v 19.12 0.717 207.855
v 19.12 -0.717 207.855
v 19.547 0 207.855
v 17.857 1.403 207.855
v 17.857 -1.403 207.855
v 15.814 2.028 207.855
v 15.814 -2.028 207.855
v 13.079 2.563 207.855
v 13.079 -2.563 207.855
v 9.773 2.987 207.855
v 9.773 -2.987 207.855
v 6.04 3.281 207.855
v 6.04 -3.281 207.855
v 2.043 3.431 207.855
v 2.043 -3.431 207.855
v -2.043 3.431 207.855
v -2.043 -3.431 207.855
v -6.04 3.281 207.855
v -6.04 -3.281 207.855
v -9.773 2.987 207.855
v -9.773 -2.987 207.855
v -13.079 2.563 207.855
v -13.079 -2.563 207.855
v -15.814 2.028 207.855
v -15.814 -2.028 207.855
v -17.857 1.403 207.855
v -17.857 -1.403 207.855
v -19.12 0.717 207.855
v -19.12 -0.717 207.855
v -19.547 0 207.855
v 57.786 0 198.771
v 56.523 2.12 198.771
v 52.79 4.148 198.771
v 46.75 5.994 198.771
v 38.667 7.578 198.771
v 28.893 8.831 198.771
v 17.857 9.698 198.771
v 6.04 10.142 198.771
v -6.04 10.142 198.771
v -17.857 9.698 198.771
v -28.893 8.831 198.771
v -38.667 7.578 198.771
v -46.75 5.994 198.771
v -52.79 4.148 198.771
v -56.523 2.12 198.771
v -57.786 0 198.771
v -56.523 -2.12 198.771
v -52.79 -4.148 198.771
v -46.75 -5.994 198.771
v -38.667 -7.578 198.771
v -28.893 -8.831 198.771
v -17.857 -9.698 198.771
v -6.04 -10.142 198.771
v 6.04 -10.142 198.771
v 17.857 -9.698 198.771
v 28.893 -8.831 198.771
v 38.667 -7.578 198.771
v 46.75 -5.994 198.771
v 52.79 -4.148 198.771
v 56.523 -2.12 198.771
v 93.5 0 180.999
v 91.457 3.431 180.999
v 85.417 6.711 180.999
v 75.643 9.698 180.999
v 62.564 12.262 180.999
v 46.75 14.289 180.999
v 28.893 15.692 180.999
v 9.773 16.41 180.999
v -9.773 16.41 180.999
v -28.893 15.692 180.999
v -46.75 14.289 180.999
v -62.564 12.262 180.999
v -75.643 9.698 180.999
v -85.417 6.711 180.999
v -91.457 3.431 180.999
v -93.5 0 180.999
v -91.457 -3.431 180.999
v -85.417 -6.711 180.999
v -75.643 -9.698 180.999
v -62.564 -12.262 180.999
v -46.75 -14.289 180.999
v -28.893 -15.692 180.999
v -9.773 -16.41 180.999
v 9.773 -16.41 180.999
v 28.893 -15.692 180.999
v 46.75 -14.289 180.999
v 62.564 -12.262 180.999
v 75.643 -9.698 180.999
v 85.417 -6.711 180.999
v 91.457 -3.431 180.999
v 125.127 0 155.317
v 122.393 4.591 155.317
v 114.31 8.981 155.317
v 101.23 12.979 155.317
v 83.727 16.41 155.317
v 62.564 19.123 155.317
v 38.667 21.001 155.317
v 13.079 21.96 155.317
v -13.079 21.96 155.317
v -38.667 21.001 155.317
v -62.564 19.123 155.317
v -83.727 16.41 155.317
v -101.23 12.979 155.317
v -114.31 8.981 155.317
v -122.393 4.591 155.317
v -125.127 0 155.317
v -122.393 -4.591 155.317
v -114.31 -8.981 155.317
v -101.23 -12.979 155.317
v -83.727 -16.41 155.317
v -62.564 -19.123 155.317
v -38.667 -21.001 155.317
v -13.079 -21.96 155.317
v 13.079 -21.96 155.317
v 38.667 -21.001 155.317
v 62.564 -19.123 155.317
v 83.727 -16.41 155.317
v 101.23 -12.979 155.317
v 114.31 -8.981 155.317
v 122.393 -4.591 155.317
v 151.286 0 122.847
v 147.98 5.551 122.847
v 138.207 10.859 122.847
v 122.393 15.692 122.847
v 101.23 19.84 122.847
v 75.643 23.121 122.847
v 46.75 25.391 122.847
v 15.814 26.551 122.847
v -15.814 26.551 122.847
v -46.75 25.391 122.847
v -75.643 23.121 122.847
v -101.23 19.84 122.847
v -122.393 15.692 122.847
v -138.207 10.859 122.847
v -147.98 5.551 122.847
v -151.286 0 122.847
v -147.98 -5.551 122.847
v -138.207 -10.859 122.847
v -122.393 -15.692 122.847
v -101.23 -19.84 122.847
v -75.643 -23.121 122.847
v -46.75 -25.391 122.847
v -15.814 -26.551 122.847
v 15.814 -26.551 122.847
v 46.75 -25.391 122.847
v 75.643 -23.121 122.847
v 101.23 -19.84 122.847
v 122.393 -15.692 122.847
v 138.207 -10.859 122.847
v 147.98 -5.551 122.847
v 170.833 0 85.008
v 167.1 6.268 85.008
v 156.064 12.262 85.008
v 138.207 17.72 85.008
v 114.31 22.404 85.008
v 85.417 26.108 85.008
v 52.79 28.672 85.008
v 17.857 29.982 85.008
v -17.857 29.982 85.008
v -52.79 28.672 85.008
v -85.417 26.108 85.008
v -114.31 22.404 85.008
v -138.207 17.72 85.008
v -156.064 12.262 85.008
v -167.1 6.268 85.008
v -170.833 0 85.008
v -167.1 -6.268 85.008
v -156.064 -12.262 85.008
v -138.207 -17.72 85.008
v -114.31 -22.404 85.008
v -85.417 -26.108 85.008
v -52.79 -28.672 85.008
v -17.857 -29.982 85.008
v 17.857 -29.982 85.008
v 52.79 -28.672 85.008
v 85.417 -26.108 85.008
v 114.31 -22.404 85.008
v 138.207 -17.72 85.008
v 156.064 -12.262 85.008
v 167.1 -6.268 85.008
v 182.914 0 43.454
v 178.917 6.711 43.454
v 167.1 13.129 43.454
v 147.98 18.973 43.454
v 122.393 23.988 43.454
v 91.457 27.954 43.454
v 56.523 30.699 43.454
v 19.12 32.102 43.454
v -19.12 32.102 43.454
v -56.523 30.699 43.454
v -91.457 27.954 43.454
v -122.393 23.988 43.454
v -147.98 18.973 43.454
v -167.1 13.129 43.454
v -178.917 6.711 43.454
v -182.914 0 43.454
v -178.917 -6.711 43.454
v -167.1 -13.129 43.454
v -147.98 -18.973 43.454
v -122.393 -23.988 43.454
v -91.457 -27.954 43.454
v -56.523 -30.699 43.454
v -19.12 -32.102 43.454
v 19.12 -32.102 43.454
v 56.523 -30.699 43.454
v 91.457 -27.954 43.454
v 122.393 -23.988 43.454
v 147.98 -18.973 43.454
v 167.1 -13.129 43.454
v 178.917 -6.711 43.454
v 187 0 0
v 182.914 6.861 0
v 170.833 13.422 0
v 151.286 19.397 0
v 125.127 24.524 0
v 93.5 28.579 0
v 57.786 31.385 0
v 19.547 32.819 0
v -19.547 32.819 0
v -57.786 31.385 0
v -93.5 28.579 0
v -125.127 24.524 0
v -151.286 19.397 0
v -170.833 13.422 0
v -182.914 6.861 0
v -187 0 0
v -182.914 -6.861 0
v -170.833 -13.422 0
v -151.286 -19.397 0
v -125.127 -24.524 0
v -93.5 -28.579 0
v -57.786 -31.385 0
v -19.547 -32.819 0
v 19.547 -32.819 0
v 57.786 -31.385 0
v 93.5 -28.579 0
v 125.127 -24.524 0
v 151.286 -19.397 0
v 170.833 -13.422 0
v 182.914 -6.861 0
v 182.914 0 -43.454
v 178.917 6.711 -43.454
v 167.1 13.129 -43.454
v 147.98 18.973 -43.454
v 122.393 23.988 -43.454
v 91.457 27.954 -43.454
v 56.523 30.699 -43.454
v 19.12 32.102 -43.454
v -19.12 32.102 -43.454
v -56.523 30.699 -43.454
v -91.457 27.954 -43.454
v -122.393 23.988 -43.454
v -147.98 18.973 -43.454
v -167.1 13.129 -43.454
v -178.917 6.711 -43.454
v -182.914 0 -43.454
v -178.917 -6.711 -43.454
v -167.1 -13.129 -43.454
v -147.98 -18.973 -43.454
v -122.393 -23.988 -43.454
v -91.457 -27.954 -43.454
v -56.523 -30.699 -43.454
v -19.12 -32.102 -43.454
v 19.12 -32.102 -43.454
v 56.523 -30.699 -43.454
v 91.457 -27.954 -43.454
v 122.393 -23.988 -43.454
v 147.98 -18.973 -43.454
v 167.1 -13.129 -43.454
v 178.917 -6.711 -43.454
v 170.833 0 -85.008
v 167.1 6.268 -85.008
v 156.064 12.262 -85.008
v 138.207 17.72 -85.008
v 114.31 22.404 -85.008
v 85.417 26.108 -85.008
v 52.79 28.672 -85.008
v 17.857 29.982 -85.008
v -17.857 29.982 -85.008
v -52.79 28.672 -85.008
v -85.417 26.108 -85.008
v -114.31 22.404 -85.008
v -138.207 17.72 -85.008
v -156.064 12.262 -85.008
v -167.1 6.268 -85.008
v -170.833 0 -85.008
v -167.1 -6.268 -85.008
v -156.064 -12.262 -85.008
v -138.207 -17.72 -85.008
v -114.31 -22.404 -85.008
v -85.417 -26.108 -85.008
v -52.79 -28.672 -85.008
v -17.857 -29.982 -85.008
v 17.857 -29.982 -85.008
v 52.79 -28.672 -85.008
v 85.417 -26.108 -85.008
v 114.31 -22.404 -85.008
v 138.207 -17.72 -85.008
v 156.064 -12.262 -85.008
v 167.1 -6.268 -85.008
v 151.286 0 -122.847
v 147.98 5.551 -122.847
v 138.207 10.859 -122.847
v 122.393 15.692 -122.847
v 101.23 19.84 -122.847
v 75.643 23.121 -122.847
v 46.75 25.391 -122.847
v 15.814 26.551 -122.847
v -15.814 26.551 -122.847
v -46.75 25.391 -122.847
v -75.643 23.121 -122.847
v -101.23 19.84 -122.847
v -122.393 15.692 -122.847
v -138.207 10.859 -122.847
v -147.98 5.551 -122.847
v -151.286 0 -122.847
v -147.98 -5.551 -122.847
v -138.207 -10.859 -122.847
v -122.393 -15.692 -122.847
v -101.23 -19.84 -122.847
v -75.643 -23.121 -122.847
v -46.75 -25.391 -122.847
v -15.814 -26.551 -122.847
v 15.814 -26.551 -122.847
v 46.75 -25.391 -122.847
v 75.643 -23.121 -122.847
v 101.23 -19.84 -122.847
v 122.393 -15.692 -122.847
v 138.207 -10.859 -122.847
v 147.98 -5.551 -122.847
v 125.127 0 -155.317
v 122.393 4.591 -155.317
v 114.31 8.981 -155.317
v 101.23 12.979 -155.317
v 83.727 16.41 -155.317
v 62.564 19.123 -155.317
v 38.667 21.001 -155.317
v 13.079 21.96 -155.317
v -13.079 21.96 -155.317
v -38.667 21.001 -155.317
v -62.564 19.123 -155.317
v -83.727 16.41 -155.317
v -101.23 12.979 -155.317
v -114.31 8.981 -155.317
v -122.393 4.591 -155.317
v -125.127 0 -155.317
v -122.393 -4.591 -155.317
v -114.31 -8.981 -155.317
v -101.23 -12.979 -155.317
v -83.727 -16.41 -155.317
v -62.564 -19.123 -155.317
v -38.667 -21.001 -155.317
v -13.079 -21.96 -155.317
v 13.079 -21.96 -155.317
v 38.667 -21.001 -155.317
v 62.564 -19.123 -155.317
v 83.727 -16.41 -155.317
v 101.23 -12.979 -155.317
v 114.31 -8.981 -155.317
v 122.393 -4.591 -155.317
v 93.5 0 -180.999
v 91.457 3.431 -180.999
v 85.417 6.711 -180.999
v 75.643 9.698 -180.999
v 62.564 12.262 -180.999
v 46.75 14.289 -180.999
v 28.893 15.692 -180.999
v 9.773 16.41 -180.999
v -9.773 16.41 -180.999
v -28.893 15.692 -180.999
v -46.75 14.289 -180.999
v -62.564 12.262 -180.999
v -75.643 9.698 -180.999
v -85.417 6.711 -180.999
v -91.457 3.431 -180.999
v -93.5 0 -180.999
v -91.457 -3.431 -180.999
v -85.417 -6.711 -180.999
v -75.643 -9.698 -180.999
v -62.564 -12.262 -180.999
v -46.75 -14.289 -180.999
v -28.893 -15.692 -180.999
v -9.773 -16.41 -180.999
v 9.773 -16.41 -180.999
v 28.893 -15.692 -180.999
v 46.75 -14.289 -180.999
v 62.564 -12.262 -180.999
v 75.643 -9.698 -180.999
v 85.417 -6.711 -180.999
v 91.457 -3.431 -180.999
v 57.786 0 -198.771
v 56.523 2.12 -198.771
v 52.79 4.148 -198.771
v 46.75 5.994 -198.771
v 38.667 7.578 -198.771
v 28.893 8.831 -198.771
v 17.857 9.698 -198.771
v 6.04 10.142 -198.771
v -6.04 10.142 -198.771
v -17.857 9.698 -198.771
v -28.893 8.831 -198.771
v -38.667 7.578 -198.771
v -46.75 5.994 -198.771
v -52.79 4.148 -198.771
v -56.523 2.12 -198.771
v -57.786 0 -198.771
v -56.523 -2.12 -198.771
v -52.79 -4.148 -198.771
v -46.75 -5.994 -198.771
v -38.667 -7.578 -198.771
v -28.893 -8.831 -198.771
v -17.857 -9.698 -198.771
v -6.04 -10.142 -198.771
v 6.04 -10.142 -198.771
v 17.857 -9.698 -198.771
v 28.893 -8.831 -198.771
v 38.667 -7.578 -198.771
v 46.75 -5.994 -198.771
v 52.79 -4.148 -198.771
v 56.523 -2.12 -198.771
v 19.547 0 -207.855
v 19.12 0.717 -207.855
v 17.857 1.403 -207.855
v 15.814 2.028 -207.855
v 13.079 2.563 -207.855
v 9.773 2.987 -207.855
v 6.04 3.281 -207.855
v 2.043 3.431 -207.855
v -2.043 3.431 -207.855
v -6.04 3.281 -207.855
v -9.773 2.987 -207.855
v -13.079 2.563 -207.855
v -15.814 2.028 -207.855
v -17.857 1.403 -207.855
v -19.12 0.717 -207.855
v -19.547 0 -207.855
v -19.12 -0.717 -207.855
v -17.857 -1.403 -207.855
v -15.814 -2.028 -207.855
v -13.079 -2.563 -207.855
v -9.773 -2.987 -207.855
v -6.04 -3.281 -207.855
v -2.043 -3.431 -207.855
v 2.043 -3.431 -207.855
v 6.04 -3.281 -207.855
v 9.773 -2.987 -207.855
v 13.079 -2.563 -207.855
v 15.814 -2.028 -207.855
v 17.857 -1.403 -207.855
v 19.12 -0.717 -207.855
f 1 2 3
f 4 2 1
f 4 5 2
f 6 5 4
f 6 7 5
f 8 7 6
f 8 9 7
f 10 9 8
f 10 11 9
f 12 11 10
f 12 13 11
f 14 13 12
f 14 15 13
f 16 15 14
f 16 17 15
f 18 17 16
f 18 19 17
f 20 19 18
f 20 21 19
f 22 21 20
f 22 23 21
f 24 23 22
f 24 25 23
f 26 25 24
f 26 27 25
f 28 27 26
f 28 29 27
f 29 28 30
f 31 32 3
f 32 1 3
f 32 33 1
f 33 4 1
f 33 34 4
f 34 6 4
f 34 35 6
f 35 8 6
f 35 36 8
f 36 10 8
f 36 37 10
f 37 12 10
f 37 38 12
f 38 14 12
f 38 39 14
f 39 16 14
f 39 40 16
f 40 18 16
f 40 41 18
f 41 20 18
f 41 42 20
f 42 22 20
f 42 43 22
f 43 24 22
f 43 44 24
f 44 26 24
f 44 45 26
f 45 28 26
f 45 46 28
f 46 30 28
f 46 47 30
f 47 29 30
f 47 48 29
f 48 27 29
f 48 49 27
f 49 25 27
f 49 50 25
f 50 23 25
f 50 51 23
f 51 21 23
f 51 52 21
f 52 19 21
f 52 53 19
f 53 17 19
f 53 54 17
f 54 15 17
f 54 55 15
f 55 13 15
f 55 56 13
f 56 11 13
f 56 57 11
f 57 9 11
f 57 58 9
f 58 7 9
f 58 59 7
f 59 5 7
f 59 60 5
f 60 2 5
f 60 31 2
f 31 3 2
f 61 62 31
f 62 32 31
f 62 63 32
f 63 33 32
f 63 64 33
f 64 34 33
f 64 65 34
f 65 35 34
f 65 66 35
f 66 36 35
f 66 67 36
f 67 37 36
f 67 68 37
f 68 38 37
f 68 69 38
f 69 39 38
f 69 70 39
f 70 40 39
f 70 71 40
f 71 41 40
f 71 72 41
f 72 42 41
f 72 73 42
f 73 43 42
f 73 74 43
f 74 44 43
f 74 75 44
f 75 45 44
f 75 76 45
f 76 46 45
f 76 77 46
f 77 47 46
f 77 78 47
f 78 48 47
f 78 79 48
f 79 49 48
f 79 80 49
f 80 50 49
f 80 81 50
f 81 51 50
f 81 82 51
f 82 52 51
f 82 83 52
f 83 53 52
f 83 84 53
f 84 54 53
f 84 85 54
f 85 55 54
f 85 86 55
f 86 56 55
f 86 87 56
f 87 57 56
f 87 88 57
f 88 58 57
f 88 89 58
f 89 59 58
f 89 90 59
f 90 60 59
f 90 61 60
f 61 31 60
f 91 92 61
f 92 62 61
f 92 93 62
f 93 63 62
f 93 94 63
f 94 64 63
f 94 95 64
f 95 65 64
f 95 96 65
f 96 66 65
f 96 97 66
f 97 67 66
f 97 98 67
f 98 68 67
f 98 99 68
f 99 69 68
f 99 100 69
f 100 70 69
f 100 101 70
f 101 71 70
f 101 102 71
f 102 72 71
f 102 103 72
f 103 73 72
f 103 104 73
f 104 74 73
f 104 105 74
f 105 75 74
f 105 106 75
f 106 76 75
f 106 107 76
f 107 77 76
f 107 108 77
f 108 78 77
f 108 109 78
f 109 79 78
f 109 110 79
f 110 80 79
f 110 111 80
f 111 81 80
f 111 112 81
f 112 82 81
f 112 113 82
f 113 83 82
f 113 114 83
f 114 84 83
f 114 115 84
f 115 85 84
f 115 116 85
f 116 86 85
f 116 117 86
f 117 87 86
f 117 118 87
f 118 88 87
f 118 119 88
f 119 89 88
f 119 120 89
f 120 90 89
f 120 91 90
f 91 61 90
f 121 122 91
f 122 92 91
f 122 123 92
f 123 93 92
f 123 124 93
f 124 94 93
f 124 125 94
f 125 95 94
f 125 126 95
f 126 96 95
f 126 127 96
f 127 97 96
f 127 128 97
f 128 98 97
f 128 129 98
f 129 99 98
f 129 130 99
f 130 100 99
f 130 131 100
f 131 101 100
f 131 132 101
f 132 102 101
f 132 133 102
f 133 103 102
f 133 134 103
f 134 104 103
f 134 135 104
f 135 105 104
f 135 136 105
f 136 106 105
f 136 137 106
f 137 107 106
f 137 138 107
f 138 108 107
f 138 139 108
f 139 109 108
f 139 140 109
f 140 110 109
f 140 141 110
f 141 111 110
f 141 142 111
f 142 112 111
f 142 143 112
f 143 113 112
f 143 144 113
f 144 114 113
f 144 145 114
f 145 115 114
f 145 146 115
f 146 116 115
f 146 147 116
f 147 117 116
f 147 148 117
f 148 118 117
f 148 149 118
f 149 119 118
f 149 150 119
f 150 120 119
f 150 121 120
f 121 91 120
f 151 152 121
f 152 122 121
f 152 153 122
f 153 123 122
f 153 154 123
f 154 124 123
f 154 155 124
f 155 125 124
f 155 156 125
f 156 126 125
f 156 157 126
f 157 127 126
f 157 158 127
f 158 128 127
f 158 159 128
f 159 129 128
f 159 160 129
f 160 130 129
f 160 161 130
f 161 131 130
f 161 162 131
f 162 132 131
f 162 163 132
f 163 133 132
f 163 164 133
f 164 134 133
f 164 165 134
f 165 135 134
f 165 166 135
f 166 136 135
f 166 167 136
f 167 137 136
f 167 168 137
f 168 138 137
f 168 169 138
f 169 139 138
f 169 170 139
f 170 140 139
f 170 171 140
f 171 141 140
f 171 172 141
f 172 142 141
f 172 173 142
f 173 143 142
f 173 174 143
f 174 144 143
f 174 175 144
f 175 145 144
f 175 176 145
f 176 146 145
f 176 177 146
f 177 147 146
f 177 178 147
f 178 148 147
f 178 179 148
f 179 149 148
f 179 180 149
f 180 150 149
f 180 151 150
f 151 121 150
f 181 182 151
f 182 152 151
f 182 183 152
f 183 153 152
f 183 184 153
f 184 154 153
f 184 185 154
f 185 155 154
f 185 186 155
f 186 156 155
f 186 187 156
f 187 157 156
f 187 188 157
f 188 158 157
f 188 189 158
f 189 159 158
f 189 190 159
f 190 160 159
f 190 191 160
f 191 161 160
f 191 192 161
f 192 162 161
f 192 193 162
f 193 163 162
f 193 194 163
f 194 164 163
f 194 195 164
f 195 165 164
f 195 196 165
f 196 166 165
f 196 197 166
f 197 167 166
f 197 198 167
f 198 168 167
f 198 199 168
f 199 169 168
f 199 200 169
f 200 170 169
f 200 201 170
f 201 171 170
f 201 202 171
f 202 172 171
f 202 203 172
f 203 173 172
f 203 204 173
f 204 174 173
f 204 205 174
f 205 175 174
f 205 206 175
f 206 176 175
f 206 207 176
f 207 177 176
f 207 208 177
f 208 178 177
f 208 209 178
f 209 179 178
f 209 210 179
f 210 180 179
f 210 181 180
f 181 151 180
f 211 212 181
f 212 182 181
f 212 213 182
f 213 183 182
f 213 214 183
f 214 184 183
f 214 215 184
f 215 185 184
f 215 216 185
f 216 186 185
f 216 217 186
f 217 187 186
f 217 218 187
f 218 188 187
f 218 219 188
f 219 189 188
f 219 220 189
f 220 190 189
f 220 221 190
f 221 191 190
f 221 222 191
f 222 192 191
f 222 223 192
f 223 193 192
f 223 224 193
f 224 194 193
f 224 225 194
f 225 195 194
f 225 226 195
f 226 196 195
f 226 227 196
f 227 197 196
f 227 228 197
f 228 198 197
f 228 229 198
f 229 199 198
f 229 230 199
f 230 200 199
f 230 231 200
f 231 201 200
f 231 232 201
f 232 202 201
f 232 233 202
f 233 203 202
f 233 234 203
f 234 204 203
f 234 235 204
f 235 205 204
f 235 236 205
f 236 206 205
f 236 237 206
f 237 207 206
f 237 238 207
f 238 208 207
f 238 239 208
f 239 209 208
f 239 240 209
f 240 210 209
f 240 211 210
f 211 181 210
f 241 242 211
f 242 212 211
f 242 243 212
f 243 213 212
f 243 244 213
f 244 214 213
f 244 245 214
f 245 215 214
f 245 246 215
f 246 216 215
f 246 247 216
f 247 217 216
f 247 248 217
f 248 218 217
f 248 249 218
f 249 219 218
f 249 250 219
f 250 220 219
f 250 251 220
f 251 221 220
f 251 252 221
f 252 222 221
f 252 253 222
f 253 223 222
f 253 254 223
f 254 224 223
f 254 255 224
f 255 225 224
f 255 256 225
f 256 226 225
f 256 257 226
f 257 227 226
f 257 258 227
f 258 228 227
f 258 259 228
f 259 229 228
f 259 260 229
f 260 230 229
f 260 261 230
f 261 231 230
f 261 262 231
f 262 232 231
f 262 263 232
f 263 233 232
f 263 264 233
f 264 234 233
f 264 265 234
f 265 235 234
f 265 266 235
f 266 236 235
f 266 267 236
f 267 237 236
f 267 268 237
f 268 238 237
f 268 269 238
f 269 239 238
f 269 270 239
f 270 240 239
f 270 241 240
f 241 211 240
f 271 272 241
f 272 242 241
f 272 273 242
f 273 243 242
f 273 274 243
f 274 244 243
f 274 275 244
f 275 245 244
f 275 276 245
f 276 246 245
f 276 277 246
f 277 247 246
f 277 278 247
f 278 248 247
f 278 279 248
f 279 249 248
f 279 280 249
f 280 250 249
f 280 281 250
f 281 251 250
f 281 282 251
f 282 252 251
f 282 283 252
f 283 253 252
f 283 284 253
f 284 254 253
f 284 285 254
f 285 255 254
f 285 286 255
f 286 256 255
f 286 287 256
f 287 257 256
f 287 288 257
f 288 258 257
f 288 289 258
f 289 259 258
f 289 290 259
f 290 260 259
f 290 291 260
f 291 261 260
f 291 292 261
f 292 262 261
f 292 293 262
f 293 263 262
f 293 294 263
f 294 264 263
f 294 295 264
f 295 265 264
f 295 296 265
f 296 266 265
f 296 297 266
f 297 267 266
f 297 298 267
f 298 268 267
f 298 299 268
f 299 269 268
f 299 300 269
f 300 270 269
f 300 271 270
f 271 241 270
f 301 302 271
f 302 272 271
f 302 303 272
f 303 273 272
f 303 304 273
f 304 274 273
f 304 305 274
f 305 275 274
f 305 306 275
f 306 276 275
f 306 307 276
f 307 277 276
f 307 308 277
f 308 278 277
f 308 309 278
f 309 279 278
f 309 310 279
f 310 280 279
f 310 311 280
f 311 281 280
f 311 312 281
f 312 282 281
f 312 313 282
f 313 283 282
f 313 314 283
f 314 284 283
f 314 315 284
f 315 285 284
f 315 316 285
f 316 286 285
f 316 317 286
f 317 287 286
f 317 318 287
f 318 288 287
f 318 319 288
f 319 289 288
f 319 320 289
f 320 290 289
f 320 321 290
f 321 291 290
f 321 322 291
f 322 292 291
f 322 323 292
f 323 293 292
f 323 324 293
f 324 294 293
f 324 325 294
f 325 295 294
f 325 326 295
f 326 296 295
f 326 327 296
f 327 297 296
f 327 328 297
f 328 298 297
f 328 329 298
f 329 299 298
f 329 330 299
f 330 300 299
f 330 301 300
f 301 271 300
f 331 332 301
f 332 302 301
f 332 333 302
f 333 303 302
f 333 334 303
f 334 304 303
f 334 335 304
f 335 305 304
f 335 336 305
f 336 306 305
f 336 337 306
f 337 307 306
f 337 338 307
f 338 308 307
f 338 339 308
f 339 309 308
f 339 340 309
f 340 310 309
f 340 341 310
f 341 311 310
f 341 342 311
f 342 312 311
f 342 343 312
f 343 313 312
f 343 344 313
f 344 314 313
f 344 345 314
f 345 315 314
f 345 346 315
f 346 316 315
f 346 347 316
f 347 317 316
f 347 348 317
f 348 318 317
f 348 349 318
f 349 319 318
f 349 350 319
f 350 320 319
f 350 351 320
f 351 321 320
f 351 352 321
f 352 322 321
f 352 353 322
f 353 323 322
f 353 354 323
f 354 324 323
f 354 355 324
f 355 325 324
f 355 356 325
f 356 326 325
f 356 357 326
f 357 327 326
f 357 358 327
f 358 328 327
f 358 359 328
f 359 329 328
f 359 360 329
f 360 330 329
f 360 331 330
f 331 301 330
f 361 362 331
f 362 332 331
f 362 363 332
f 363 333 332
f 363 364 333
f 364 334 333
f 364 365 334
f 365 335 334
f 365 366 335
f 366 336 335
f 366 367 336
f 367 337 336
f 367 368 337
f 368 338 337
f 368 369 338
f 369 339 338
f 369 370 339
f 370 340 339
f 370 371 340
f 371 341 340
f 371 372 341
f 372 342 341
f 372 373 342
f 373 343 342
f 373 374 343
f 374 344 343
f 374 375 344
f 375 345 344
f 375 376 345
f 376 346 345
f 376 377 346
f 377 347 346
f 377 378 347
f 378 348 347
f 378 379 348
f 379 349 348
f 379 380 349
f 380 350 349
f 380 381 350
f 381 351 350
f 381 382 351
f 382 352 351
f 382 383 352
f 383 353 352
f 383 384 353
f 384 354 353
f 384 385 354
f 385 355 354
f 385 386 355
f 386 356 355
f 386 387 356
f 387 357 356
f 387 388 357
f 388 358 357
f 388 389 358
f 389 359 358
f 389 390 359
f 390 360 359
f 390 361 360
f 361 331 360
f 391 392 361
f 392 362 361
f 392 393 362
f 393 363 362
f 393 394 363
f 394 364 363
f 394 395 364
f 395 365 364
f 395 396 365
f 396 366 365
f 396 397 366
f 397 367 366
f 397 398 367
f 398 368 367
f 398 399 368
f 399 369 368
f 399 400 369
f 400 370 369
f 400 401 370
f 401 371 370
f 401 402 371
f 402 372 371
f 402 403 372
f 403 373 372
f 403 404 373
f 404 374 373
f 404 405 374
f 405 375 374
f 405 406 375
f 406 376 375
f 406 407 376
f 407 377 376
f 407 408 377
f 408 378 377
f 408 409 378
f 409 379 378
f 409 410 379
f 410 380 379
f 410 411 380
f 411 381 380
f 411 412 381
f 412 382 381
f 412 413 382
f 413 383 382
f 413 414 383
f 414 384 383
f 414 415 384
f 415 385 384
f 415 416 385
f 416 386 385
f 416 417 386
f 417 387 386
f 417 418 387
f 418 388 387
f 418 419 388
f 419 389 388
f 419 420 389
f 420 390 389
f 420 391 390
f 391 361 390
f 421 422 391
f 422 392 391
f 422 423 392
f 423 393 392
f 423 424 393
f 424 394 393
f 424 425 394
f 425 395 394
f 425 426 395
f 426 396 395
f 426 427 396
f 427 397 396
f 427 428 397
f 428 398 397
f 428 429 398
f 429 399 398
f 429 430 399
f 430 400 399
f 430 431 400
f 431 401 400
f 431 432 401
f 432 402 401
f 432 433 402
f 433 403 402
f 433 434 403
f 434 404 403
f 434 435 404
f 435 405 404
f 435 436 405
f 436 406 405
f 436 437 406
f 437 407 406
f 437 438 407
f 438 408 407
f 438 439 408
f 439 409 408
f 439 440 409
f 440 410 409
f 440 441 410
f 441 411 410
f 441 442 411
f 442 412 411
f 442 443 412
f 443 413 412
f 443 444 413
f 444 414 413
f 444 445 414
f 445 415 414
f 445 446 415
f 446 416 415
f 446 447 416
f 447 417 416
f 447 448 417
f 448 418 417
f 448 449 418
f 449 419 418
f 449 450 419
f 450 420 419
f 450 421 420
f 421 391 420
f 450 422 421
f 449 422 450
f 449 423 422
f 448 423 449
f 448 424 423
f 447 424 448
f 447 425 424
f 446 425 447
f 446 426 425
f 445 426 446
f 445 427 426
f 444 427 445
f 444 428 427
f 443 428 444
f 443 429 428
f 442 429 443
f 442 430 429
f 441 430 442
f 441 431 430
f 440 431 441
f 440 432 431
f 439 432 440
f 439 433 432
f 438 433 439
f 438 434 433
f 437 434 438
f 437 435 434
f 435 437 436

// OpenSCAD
// Generated by SolidPython 1.0.1 on 2020-07-29 00:46:52


scale(v = [17, 3, 19]) {
	sphere(r = 11);
}
/***********************************************
*********      SolidPython code:      **********
************************************************
 
# import packages: SolidPython
from solid import *
from solid.utils import *
from itertools import chain, combinations, permutations


class Resize:

    def __init__(self, scad_file):
        self.scad_file = scad_file
        #self.scad_file = import_scad(scad_file)
        # cone/cylinder param:
        self.r1 = 0
        self.r2 = 0
        self.h = 0
        # rectangular prism param:
        self.w = 0
        self.l = 0
        # ellipse param:
        self.r = 0

    # import OpenScad code (file name corresponds to shape)


    # classify shape + parameters
    def assign(self, param1, param2, param3):
        if self.scad_file == 'cone.scad':
            self.r1 = param1
            self.r2 = param2
            self.h = param3
        elif self.scad_file == 'cylinder.scad':
            self.r1 = param1
            self.r2 = param2
            self.h = param3
        elif self.scad_file == 'rectangularPrism.scad':
            self.h = param1
            self.l = param2
            self.w = param3
        else:
            self.r = param1
            self.h = param2

    # resize parameters
    def iterate(self):
        x = range(3, 20, 2)
        i = 1
        if self.scad_file == 'cone.scad':
            tempList = list(permutations(x, 2))
            for temp in tempList:
                param1 = temp[0]
                param2 = temp[1]
                filepath = 'produced_scad_files/' + 'cone' + str(param1) + '_' + str(param2) + '_' + '.scad'
                scad_render_to_file(cylinder(h=param1, r1=param2, r2=0), filepath)

        elif self.scad_file == 'cylinder.scad':
            tempList = list(permutations(x, 3))
            for temp in tempList:
                param1 = temp[0]
                param2 = temp[1]
                filepath = 'produced_scad_files/' + 'cylinder' + str(param1) + '_' + str(param2) + '_' + '.scad'
                scad_render_to_file(cylinder(h=param1, r1=param2, r2=param2), filepath)

        elif self.scad_file == 'rectangularPrism.scad':
            tempList = list(permutations(x, 3))
            for temp in tempList:
                param1 = temp[0]
                param2 = temp[1]
                param3 = temp[2]
                filepath = 'produced_scad_files/' + 'rectangularPrism' + str(param1) + '_' + str(param2) + '_' + str(
                    param3) + '.scad'
                scad_render_to_file(cube(size=(param1, param2, param3)), filepath)

        elif self.scad_file == 'ellipse.scad':
            tempList = list(permutations(x, 4))
            for temp in tempList:
                param1 = temp[0]
                param2 = temp[1]
                param3 = temp[2]
                param4 = temp[3]
                filepath = 'produced_scad_files/' + 'ellipse' + str(param1) + '_' + str(param2) + '_' + str(param3) + '_' + str(param4) + '.scad'
                scad_render_to_file(scale([param1, param2, param3])(sphere(r=param4)), filepath)

    def render_to_scadfile(self):
        scad_render_to_file(scad, 'example.scad') 
 
************************************************/
